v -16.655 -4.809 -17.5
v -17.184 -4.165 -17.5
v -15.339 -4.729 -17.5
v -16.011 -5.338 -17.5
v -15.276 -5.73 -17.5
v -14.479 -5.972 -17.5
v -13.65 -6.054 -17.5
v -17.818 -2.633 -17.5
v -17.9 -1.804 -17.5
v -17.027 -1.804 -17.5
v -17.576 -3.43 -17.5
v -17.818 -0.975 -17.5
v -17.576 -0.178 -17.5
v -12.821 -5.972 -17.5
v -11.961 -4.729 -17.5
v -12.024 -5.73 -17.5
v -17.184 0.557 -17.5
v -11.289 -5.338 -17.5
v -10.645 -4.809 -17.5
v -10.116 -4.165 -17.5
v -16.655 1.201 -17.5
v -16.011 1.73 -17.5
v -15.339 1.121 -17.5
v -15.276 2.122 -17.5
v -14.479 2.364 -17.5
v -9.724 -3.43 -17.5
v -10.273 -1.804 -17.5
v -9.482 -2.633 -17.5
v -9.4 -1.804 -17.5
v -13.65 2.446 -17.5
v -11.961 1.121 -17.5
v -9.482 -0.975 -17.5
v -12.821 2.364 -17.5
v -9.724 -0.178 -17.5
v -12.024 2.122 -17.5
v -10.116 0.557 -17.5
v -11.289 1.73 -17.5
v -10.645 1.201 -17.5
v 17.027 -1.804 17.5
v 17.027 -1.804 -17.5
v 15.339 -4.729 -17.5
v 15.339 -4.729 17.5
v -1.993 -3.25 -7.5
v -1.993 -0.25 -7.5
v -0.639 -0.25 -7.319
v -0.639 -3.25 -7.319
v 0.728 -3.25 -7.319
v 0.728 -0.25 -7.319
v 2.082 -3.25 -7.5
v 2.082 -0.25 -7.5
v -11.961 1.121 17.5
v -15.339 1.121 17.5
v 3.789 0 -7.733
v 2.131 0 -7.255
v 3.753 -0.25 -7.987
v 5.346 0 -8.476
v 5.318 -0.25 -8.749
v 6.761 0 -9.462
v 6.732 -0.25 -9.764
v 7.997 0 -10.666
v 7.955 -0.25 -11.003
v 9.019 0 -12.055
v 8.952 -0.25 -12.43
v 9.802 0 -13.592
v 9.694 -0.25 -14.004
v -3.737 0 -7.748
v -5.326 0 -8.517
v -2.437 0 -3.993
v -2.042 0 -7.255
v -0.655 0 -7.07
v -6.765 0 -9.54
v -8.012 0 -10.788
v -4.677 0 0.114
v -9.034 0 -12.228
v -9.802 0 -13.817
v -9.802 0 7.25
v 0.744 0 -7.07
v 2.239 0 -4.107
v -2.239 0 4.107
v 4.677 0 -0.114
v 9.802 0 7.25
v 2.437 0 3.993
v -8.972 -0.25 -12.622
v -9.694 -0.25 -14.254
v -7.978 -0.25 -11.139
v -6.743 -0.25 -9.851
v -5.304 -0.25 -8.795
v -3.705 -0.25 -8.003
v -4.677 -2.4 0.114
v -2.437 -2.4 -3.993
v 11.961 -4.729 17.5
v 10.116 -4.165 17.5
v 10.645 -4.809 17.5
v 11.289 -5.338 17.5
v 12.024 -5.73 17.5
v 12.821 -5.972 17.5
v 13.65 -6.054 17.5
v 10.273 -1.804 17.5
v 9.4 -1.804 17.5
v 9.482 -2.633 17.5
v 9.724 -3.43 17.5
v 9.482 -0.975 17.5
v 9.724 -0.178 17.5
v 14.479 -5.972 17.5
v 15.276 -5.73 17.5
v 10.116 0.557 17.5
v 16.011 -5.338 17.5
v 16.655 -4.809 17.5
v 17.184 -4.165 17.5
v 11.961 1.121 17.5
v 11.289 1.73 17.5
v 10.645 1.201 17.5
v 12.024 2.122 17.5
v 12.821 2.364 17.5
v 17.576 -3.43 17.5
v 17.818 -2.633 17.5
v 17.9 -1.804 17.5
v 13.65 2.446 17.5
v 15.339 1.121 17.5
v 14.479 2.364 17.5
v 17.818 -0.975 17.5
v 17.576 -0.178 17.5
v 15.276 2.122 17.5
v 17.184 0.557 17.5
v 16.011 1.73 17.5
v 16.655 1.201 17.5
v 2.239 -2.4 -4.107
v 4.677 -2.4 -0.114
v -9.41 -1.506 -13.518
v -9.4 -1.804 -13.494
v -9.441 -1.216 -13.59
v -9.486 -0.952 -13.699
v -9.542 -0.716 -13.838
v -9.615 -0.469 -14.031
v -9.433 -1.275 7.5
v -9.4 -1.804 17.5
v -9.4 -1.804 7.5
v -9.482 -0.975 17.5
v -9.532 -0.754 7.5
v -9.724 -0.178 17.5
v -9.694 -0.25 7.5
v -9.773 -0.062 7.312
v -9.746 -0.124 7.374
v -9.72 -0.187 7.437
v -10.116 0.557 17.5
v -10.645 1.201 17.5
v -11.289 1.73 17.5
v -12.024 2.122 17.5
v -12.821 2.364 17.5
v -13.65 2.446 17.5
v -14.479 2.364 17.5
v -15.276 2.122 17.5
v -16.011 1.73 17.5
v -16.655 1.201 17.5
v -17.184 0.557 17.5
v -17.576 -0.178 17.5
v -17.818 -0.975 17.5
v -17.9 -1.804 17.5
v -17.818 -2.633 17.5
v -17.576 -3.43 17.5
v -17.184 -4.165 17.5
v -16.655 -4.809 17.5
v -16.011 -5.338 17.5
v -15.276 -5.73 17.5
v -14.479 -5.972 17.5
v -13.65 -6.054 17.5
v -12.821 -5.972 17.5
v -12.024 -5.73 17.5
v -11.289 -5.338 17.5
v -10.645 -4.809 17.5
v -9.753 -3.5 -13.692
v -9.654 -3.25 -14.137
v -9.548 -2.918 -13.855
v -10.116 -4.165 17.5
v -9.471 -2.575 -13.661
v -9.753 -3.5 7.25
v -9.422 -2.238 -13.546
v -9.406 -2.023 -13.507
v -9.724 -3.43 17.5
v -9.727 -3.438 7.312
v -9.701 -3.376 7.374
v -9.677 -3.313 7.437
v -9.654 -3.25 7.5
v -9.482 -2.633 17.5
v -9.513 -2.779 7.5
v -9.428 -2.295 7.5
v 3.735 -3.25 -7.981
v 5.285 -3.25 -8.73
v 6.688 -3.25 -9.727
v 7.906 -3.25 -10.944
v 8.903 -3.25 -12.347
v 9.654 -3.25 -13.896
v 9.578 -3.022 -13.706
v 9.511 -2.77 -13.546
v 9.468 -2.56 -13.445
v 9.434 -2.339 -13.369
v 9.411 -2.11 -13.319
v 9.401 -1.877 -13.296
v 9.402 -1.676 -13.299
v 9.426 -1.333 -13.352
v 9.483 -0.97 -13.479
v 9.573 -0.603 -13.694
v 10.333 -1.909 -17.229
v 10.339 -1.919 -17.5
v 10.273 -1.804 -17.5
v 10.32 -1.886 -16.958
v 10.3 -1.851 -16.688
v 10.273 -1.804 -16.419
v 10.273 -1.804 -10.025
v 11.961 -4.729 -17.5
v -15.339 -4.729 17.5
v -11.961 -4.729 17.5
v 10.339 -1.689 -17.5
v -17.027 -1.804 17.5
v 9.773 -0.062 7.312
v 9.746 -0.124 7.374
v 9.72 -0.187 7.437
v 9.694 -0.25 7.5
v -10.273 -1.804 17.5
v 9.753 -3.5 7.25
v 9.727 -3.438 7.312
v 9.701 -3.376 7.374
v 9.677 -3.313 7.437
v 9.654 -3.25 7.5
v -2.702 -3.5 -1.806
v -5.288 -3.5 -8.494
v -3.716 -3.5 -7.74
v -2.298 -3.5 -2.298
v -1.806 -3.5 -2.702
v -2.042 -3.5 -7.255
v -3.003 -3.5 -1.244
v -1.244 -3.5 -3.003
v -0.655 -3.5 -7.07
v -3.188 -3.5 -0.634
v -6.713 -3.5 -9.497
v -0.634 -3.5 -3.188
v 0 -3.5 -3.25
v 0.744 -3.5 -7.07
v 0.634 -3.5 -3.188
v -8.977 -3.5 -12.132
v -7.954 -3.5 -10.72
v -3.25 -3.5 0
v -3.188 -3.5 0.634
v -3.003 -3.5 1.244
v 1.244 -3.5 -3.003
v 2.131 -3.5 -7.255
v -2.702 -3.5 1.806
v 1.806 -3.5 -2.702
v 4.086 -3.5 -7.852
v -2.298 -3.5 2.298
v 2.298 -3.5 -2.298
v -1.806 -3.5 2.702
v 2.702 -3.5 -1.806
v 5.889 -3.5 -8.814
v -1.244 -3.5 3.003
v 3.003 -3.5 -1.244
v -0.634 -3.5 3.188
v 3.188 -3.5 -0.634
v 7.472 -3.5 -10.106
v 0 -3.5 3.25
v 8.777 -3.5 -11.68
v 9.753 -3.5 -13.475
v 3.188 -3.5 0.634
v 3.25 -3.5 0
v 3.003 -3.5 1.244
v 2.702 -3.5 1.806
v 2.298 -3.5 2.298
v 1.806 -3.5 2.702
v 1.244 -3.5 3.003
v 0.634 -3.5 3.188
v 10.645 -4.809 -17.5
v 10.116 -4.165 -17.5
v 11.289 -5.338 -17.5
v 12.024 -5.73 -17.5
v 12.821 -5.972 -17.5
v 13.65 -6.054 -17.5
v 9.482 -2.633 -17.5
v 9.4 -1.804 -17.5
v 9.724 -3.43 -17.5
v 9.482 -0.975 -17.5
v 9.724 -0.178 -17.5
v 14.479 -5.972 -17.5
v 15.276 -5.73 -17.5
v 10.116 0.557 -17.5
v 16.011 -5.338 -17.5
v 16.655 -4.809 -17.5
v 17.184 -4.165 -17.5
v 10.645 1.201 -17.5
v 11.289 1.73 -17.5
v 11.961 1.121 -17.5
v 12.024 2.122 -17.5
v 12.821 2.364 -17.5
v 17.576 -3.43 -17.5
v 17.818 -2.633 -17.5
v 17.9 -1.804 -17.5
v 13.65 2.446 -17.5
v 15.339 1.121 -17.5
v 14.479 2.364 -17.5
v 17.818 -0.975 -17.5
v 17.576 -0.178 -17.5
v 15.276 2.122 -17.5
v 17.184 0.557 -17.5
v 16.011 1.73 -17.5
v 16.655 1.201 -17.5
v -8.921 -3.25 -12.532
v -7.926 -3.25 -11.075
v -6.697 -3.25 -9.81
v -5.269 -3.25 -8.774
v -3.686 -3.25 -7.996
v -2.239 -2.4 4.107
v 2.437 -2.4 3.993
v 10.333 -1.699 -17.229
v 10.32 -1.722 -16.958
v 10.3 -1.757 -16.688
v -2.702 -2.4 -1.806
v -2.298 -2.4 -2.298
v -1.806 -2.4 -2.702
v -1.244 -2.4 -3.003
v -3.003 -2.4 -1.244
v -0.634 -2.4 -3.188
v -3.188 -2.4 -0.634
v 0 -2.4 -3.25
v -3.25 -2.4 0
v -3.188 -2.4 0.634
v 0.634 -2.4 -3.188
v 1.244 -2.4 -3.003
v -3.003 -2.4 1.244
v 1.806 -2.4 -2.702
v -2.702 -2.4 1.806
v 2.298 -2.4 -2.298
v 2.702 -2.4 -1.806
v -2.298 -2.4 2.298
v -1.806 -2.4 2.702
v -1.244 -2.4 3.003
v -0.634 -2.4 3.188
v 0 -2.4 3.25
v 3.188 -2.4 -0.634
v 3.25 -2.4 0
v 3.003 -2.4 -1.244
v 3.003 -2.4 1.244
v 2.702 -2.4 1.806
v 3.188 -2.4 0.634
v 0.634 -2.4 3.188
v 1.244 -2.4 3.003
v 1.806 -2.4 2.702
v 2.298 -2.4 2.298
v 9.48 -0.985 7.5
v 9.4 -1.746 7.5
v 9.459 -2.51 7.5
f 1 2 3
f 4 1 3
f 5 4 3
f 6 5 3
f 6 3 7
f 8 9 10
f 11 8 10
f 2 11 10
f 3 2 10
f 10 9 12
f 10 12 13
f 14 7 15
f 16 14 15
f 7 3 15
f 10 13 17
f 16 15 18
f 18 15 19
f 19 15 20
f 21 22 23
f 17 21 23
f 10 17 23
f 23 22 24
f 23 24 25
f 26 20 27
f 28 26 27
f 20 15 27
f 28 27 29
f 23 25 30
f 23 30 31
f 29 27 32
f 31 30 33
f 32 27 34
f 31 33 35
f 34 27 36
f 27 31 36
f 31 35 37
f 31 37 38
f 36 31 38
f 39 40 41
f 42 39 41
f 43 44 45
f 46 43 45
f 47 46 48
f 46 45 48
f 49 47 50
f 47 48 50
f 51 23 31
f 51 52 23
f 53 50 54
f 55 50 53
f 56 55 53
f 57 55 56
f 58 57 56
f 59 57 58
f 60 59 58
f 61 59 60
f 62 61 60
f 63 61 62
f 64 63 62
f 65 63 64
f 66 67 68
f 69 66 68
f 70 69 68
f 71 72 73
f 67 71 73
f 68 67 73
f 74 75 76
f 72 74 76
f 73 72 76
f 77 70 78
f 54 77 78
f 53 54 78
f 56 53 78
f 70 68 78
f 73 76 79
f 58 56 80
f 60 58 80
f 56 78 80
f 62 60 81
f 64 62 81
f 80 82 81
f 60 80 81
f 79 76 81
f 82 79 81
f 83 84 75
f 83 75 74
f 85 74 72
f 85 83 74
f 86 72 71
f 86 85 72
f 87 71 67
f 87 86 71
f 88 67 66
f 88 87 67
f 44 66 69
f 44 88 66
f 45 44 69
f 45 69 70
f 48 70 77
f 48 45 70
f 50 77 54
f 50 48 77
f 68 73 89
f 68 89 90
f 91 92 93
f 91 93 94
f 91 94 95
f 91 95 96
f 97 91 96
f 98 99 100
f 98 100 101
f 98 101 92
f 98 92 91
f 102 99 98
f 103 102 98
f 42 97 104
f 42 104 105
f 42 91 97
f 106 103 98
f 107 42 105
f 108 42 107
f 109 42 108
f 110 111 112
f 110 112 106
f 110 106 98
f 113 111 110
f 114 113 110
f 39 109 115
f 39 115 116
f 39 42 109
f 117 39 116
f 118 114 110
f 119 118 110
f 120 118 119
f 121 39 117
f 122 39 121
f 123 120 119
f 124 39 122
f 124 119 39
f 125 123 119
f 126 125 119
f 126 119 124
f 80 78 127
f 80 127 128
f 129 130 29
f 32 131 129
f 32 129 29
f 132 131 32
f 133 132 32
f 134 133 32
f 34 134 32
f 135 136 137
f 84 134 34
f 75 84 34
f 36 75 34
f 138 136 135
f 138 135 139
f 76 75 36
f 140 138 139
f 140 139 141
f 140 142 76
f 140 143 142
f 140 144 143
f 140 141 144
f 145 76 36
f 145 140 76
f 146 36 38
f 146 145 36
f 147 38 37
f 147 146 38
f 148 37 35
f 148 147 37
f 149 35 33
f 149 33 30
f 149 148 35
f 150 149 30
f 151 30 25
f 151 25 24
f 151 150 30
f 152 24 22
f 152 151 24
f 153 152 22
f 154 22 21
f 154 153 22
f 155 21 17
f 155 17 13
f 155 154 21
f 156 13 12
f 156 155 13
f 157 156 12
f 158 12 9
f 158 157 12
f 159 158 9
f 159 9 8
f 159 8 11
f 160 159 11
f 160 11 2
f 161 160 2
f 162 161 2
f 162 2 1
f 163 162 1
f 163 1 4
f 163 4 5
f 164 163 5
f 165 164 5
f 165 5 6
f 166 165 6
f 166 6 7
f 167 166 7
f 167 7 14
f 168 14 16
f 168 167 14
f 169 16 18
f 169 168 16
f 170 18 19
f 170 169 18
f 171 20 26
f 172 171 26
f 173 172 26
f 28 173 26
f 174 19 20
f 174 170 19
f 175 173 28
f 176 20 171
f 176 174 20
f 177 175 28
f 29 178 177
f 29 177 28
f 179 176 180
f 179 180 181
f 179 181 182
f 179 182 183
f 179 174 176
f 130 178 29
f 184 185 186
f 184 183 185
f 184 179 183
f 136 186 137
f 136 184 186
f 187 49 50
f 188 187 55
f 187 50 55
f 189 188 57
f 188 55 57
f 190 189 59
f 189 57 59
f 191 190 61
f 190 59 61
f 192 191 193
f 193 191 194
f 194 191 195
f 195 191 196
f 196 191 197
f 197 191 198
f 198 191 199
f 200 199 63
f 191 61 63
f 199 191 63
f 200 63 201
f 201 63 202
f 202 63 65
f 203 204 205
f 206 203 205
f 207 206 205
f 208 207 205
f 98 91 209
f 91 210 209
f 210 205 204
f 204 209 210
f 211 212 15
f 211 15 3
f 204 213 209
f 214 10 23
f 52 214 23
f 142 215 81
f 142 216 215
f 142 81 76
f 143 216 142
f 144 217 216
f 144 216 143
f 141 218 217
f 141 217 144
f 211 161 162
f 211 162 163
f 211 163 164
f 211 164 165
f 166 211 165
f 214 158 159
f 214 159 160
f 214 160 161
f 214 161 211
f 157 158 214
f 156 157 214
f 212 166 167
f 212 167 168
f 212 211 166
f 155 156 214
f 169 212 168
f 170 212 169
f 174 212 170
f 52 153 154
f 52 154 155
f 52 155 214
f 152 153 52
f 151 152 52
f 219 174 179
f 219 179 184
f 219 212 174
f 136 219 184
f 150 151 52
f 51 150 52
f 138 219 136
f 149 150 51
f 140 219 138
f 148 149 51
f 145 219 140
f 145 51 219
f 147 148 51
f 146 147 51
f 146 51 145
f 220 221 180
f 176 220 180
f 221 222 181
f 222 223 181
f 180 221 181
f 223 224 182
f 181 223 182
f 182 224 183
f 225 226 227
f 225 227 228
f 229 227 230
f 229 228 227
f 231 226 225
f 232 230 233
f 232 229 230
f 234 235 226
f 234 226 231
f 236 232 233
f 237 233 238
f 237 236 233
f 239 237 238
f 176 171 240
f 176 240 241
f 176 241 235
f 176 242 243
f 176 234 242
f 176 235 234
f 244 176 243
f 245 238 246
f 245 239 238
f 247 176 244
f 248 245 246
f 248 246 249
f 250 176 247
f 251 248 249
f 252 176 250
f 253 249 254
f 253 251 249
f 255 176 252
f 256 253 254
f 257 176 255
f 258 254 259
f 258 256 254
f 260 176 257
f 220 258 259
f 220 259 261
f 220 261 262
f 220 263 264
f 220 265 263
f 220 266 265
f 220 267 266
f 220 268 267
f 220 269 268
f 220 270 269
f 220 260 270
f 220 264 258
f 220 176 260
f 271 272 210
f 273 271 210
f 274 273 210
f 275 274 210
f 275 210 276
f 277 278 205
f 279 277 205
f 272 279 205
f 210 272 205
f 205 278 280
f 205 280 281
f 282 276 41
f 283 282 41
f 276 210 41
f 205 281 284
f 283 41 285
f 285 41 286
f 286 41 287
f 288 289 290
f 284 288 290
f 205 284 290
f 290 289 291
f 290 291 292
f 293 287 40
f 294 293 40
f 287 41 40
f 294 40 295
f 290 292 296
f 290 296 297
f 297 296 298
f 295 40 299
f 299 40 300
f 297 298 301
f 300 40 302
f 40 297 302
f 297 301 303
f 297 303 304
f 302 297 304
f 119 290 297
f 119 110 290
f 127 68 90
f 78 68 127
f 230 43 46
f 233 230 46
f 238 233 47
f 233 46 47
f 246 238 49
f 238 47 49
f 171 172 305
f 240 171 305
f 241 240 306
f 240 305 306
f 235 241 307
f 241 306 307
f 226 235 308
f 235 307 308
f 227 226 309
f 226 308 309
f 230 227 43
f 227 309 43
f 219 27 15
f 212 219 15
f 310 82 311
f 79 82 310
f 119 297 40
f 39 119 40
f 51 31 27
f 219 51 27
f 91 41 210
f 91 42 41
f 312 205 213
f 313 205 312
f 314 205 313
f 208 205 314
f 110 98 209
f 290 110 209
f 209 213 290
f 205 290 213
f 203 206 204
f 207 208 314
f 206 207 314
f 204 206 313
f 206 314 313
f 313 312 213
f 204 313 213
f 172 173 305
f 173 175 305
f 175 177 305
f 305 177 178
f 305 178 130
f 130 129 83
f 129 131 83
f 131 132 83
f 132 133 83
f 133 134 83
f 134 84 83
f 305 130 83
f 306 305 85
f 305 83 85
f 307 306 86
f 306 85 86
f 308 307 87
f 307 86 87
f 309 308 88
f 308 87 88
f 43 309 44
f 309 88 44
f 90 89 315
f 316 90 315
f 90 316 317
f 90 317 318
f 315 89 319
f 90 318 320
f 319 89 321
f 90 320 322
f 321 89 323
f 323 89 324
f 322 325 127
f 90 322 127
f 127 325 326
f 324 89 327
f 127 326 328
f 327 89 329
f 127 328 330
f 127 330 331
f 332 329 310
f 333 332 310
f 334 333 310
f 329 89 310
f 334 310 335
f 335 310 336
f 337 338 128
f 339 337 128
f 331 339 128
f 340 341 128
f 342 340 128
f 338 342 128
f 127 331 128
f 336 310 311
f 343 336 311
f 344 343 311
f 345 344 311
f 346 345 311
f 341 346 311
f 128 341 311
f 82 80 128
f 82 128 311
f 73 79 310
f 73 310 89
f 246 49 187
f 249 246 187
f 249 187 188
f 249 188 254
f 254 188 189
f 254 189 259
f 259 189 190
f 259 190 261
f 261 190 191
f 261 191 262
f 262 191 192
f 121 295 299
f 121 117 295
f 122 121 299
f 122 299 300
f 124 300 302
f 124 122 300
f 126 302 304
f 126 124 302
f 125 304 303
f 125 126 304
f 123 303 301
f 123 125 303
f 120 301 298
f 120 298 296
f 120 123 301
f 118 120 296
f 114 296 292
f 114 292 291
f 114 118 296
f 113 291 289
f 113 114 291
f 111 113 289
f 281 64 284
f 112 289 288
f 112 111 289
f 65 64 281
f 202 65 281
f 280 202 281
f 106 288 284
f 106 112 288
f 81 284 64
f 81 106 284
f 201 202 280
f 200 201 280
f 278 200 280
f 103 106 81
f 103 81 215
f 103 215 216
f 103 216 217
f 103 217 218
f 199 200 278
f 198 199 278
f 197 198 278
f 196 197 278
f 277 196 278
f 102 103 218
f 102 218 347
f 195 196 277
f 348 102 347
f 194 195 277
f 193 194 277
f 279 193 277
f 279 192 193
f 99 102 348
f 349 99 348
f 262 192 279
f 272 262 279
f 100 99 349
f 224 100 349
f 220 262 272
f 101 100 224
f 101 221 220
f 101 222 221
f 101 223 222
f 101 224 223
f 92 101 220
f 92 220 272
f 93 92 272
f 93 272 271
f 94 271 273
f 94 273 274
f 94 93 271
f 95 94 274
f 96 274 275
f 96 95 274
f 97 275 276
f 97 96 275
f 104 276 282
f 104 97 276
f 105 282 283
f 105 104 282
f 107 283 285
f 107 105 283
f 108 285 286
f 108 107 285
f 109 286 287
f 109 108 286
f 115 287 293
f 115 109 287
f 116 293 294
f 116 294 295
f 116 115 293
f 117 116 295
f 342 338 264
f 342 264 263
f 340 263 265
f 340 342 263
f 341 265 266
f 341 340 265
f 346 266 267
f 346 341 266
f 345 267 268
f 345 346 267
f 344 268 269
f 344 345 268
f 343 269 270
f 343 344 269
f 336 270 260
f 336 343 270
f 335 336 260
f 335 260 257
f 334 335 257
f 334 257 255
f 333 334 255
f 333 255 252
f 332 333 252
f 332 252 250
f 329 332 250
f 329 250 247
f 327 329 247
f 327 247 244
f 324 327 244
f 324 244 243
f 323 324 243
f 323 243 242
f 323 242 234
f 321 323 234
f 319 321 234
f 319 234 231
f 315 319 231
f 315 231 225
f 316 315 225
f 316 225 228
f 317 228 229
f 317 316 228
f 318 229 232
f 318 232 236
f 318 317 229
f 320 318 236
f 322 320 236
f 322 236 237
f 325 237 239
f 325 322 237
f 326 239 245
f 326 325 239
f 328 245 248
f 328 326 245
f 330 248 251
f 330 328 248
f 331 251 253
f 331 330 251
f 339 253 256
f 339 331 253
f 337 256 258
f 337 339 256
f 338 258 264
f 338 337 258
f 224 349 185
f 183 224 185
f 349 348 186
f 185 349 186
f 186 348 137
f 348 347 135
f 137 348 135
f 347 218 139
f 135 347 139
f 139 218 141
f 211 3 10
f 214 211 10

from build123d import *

# Parameters (mm, degrees)
F0_R          = 3.25
F1_DEPTH      = 3.5
F3_DEPTH      = 2.4
F4_R          = 4.25
F5_DEPTH      = 17.5
F5_DEPTH_BACK = 17.5
F6_SIZE       = 0.25


with BuildPart() as f1:
    # F0 (on Front) → F1 (new body)
    with BuildSketch(Plane.XZ):
        with BuildLine():
            Line((10.3391141687, -17.4996029254), (10.25, -7.5))
            Line((10.25, -7.5), (2.081973366, -7.5))
            ThreePointArc((2.081973366, -7.5), (7.9829074445, -11.0362777063), (10.3391141687, -17.4996029254))
        make_face()
        with BuildLine():
            Line((2.081973366, -7.5), (10.25, -7.5))
            Line((10.25, -7.5), (10.25, 7.5))
            Line((10.25, 7.5), (-10.25, 7.5))
            Line((-10.25, 7.5), (-10.25, -7.5))
            Line((-10.25, -7.5), (-1.9928591974, -7.5))
            ThreePointArc((-1.9928591974, -7.5), (0.0445570843, -7.2963797866), (2.081973366, -7.5))
        make_face()
        Circle(F0_R, mode=Mode.SUBTRACT)
        with BuildLine():
            ThreePointArc((-10.25, -17.4996029254), (-7.8937932759, -11.0362777063), (-1.9928591974, -7.5))
            Line((-1.9928591974, -7.5), (-10.25, -7.5))
            Line((-10.25, -7.5), (-10.25, -17.4996029254))
        make_face()
    extrude(amount=F1_DEPTH)

    # F2 (on Front) → F3 (cut)
    with BuildSketch(Plane.XZ):
        Polygon((-2.4370454627, -3.9929711461), (2.2394917178, -4.1070288539), (4.6765371804, -0.1140577078), (2.4370454627, 3.9929711461), (-2.2394917178, 4.1070288539), (-4.6765371804, 0.1140577078), align=None)
    extrude(amount=F3_DEPTH, mode=Mode.SUBTRACT)

    # F4 (on Top) → F5 (join, two sides)
    with BuildSketch(Plane.XY) as f5_sk:
        with Locations((13.65, -1.804011694)):
            Circle(F4_R)
        Polygon((17.0274990748, -1.804011694), (15.3387495374, -4.729011694), (11.9612504626, -4.729011694), (10.2725009252, -1.804011694), (11.9612504626, 1.120988306), (15.3387495374, 1.120988306), align=None, mode=Mode.SUBTRACT)
        with Locations((-13.65, -1.804011694)):
            Circle(F4_R)
        Polygon((-11.9612504626, -4.729011694), (-15.3387495374, -4.729011694), (-17.0274990748, -1.804011694), (-15.3387495374, 1.120988306), (-11.9612504626, 1.120988306), (-10.2725009252, -1.804011694), align=None, mode=Mode.SUBTRACT)
    extrude(amount=F5_DEPTH)
    extrude(f5_sk.sketch, amount=-F5_DEPTH_BACK)

    # F6
    f6_edges = [f1.edges().sort_by_distance(p)[0] for p in [
        (0, -3.5, 7.5),
        (0, 0, 7.5),
        (-0.094724, -3.5, -7.297322),
        (-0.101304, 0, -7.297413),
    ]]
    chamfer(f6_edges, length=F6_SIZE)


solid = f1.part
